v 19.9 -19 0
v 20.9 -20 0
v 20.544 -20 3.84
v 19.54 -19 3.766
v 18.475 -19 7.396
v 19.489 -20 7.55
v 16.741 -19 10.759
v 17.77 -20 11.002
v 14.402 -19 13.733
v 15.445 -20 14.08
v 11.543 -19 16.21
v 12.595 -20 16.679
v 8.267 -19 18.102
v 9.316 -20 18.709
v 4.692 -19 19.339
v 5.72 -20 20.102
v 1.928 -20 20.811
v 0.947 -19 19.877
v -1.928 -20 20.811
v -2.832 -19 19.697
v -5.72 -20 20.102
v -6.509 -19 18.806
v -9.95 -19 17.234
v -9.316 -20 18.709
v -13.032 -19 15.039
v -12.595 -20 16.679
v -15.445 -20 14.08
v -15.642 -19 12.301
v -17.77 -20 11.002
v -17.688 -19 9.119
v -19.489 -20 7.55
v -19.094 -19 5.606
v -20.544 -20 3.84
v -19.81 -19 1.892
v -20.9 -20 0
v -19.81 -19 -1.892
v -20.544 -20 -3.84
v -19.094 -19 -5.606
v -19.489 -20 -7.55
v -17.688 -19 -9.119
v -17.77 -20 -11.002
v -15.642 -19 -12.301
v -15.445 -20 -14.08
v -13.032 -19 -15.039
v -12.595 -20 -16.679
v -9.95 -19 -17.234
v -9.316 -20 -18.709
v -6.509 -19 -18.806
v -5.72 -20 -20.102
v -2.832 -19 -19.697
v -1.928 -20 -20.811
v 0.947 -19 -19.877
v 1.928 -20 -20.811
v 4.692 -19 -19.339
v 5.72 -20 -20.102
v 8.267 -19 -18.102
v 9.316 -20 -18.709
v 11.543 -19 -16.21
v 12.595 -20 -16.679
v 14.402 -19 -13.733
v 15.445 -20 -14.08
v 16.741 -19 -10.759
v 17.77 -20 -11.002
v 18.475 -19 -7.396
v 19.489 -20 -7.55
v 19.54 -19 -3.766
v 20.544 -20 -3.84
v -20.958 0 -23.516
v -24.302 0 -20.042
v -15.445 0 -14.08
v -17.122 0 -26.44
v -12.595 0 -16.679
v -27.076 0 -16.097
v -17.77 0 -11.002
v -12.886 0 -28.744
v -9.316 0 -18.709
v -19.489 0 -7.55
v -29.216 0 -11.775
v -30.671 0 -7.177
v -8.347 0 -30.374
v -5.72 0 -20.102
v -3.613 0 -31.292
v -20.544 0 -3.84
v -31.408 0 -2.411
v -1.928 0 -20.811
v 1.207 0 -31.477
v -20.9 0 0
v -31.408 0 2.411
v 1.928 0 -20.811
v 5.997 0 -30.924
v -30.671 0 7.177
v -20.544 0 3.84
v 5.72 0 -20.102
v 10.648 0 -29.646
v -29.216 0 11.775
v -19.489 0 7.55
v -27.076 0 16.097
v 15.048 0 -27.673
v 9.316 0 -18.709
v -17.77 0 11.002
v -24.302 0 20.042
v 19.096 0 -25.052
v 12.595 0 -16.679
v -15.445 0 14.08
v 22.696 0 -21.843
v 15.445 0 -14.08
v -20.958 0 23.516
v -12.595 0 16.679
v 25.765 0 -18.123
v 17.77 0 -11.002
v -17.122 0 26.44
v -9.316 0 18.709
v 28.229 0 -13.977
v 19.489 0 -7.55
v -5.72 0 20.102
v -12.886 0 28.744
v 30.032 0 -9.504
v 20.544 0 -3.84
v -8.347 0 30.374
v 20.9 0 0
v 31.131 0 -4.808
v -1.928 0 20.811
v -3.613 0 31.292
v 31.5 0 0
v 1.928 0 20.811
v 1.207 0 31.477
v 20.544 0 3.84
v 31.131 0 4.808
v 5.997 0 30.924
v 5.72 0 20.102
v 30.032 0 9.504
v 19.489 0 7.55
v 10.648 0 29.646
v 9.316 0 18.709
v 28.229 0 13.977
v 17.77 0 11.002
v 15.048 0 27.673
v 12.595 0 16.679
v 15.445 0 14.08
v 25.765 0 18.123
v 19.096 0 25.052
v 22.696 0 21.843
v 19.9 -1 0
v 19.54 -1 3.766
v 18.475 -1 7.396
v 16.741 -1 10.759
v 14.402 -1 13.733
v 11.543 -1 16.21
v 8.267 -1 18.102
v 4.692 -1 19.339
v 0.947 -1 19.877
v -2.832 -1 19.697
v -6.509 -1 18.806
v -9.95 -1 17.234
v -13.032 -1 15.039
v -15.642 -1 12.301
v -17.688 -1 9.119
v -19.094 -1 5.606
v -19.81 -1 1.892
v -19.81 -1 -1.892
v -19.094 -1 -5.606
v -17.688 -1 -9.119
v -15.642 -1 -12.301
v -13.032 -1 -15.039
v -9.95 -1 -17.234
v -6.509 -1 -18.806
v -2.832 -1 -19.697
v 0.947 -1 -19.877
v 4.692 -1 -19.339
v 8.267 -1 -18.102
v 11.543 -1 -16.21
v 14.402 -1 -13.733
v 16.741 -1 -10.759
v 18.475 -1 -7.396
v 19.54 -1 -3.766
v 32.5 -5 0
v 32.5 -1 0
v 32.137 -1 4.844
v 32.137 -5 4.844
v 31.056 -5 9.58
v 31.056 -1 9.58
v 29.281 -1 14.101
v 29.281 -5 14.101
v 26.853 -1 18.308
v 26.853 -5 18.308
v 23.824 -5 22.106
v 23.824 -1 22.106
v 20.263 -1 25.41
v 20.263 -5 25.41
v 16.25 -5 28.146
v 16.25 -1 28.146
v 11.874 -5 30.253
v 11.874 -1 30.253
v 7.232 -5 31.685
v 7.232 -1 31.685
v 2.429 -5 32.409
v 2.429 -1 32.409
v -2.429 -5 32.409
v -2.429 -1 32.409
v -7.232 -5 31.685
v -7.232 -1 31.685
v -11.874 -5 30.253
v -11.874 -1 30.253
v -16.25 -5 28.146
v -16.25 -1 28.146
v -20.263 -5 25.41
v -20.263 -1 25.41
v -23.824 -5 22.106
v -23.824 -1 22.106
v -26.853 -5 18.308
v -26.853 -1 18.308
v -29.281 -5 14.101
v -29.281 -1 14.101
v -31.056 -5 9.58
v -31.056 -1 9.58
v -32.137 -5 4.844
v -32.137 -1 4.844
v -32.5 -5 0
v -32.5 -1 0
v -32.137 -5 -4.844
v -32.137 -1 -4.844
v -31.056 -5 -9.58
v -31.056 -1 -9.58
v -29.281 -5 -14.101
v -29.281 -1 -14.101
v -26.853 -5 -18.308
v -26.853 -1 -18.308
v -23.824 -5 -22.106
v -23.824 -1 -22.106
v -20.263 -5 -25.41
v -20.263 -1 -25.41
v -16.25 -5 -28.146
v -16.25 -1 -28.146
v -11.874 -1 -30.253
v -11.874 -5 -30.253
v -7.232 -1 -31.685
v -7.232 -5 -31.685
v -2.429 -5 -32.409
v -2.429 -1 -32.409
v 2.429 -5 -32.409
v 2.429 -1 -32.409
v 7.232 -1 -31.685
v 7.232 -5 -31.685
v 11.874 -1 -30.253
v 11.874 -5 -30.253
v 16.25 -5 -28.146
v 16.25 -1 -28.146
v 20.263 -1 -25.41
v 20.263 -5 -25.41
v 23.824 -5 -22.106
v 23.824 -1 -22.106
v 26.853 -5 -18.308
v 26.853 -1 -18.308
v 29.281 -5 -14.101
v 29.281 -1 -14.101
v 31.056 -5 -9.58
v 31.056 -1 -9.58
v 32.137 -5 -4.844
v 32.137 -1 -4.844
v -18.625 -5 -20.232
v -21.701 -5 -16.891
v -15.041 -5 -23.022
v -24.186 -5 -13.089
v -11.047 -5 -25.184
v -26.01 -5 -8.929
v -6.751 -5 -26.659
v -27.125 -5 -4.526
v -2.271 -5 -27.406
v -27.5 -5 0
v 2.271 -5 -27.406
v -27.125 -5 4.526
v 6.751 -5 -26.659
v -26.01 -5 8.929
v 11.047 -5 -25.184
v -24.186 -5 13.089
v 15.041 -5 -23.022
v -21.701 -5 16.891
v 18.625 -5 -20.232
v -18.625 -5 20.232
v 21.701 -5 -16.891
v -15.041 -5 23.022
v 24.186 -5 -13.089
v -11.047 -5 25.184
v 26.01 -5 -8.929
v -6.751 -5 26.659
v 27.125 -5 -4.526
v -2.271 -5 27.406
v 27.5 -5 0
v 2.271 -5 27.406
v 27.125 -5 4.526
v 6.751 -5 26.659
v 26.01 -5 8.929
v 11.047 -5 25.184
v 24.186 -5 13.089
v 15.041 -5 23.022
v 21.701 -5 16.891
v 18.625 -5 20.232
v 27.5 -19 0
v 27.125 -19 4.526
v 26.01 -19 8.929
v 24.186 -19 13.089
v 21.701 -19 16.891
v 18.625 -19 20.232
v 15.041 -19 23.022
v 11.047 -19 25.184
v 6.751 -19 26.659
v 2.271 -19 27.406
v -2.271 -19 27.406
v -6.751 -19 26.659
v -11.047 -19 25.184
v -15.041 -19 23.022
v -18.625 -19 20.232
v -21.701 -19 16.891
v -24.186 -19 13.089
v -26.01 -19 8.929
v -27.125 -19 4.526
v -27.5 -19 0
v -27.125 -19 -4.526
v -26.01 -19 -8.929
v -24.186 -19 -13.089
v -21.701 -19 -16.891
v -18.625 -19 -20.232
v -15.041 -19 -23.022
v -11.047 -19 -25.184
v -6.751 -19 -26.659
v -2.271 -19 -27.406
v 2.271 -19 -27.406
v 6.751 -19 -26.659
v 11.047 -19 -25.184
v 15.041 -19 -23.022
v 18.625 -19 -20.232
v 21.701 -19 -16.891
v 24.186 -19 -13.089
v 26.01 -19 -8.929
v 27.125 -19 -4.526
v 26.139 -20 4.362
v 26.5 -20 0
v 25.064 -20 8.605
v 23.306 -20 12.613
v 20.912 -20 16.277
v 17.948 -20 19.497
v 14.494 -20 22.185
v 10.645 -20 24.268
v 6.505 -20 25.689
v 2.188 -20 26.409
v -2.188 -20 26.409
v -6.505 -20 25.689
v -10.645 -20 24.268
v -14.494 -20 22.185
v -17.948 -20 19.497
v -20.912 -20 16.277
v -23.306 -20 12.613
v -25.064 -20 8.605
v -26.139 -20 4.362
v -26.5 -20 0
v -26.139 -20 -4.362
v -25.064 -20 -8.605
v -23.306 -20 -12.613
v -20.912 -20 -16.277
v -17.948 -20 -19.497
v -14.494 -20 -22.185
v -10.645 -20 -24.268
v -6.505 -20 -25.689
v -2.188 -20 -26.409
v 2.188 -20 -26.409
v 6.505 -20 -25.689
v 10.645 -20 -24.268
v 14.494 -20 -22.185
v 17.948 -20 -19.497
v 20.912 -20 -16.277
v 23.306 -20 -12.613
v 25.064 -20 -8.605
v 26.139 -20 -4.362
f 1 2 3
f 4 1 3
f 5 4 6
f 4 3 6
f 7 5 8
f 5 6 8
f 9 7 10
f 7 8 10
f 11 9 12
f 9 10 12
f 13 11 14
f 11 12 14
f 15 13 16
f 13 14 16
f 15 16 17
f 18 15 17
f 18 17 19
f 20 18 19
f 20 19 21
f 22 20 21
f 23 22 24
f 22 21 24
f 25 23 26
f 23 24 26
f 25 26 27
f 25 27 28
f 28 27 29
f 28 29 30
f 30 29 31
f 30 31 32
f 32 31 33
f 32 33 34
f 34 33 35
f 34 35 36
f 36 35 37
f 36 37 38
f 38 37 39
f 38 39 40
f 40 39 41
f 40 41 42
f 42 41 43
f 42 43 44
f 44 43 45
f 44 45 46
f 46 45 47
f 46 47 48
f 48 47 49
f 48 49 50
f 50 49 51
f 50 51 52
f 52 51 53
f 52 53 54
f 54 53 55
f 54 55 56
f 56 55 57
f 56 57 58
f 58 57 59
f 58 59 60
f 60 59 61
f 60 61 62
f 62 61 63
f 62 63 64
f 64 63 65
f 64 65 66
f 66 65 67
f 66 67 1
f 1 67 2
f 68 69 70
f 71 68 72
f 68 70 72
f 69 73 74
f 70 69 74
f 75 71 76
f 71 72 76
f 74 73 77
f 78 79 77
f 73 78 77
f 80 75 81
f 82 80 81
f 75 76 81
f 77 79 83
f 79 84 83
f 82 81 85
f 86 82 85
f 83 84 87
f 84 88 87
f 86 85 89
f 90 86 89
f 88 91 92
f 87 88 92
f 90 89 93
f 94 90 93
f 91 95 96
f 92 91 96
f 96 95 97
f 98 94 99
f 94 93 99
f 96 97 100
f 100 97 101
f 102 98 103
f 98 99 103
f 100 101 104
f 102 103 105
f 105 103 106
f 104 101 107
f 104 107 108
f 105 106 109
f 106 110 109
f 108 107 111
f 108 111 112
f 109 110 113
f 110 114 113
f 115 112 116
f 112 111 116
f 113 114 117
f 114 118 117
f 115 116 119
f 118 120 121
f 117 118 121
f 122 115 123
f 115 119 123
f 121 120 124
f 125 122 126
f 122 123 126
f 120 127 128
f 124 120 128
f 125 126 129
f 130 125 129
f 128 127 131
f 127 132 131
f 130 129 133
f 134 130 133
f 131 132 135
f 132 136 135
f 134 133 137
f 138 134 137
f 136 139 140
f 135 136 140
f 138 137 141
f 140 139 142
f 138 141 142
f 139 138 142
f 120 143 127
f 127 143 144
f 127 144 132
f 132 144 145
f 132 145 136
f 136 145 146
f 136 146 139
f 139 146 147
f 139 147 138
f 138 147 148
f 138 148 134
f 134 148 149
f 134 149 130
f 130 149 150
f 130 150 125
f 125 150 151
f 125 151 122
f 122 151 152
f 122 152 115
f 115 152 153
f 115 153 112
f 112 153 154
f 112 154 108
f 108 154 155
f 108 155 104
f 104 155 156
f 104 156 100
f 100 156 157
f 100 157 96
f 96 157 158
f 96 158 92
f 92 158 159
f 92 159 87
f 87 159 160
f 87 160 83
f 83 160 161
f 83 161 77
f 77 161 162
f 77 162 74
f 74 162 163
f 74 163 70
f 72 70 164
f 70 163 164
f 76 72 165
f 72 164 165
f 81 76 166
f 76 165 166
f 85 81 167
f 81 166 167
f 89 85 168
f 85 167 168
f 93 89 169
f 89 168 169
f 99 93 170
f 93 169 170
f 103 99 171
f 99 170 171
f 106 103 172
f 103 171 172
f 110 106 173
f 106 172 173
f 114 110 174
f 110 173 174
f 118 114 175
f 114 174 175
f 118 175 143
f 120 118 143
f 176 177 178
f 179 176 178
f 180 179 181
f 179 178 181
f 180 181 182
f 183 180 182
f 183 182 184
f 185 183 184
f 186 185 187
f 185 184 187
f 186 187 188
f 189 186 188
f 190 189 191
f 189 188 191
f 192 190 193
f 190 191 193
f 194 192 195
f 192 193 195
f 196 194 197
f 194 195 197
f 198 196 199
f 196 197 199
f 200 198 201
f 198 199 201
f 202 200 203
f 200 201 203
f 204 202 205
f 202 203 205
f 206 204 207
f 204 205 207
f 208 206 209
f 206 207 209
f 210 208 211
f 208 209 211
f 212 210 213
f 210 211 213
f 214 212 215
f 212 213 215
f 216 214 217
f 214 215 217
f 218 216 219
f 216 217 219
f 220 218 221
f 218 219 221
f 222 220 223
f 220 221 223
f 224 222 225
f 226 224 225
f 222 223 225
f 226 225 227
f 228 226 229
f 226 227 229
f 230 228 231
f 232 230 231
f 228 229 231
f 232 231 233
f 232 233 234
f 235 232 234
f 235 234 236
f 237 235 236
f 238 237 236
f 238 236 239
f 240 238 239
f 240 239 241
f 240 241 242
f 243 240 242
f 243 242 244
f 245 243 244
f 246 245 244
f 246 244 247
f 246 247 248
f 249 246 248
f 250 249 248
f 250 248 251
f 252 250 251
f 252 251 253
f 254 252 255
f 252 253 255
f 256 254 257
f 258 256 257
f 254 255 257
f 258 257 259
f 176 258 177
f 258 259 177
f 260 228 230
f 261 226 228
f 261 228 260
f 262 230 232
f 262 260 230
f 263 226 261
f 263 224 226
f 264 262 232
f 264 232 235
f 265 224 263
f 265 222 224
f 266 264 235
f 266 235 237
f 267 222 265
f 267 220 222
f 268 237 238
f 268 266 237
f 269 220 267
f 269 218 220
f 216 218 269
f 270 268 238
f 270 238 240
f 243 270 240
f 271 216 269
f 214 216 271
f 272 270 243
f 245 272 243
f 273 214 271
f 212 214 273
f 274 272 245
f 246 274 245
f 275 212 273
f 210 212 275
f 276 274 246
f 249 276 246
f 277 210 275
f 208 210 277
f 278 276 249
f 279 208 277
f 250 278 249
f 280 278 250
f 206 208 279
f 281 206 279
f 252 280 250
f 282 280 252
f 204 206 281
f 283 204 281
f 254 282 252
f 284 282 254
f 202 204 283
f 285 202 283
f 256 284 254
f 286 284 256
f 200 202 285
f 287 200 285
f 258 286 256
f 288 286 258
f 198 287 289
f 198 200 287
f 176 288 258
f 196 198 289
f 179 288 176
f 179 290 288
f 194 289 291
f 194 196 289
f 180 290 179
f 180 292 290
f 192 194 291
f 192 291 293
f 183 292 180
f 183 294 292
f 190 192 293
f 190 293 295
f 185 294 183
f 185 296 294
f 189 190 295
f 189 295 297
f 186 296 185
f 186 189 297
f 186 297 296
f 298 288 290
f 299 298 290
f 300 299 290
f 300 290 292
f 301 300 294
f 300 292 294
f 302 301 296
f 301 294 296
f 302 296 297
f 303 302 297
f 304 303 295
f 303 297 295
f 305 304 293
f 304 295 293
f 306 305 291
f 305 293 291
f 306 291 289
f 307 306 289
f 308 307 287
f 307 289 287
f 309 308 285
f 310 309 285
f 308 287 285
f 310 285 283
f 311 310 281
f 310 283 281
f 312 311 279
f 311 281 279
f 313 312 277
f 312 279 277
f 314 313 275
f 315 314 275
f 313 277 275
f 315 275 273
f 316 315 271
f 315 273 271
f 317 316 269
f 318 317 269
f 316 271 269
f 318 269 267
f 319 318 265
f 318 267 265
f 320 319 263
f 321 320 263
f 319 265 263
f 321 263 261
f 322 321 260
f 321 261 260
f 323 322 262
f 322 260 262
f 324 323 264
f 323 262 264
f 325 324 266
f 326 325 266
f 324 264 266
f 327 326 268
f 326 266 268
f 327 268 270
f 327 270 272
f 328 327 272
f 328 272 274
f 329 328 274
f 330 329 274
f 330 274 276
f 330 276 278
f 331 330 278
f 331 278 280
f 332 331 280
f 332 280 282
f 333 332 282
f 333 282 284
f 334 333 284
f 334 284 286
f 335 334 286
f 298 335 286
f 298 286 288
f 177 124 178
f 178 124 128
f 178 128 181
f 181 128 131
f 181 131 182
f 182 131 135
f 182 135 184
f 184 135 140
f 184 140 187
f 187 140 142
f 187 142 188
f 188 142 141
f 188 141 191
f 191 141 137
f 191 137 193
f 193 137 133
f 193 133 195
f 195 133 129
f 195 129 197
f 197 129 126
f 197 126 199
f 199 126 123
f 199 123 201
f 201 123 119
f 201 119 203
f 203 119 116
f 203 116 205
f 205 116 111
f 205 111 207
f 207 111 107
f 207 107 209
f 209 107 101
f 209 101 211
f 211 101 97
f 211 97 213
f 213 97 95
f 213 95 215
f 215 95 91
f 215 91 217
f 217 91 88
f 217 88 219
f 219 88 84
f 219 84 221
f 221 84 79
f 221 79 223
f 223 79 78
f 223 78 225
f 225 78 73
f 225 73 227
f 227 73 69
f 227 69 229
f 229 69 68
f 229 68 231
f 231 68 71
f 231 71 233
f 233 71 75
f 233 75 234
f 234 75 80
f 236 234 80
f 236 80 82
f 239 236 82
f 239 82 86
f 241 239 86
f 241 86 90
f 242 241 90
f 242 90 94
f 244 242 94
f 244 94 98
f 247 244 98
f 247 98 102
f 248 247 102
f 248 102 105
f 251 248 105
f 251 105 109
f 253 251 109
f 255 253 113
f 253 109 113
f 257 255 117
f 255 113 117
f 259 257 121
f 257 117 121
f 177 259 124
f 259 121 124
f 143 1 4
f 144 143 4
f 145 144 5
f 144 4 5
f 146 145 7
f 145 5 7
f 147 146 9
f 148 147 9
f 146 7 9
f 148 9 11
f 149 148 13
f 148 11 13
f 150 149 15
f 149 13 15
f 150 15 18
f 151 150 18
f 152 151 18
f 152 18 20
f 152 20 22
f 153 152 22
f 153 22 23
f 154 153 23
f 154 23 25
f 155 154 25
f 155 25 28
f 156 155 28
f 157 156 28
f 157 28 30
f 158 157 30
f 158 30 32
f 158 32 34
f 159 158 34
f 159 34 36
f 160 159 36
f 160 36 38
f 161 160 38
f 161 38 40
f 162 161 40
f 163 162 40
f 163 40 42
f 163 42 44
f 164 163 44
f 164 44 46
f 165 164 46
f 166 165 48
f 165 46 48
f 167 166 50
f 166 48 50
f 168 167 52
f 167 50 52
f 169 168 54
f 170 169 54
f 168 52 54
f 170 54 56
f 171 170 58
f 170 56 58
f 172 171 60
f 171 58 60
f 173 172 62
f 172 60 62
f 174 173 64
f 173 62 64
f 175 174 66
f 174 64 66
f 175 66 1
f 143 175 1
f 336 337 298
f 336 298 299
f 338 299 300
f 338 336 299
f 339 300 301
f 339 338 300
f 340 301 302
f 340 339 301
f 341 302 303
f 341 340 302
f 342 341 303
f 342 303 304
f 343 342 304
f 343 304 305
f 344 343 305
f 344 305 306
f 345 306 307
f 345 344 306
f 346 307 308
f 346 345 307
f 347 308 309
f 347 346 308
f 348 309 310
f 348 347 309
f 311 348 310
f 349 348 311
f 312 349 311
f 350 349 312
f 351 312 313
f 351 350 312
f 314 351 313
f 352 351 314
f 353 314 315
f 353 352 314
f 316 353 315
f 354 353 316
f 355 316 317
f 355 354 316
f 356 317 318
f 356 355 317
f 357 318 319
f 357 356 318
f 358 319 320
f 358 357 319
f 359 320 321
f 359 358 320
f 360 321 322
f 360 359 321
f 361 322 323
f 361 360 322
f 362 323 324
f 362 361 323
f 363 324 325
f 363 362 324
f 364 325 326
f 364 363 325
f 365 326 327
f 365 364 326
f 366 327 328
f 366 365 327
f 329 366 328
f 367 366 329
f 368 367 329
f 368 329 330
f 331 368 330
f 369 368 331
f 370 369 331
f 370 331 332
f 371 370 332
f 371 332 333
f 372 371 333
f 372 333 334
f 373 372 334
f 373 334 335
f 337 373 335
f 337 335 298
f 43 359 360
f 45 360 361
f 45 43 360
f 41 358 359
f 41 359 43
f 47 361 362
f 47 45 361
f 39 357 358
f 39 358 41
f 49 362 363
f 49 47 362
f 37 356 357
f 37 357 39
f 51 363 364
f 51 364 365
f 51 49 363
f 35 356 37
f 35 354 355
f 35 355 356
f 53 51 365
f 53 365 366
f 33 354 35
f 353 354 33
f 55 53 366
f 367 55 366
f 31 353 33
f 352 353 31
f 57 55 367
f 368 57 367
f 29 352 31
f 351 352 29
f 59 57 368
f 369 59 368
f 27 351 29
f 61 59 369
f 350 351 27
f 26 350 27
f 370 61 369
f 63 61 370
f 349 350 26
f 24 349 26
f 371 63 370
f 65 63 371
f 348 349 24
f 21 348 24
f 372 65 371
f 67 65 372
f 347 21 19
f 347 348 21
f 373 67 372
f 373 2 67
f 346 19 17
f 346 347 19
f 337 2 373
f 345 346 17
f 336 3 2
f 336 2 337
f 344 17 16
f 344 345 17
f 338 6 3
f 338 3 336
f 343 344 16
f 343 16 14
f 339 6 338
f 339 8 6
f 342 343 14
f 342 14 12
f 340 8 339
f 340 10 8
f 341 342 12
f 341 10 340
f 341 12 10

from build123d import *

# Parameters (mm, degrees)
F0_R     = 32.5
F1_DEPTH = 5
F2_R     = 27.5
F3_DEPTH = 15
F4_R     = 19.9
F5_DEPTH = 25
F6_SIZE  = 1


with BuildPart() as f1:
    # F0 (on Front) → F1 (new body)
    with BuildSketch(Plane.XZ):
        Circle(F0_R)
    extrude(amount=F1_DEPTH)

    # F2 (on face) → F3 (join)
    with BuildSketch(Plane.XZ.offset(5)):
        Circle(F2_R)
    extrude(amount=F3_DEPTH)

    # F4 (on face) → F5 (cut)
    with BuildSketch(Plane.XZ.offset(20)):
        Circle(F4_R)
    extrude(amount=-F5_DEPTH, mode=Mode.SUBTRACT)

    # F6
    f6_edges = [f1.edges().sort_by_distance(p)[0] for p in [
        (-32.5, 0, 0),
        (-27.5, -20, 0),
        (-19.9, -20, 0),
        (-19.9, 0, 0),
    ]]
    chamfer(f6_edges, length=F6_SIZE)


solid = f1.part
